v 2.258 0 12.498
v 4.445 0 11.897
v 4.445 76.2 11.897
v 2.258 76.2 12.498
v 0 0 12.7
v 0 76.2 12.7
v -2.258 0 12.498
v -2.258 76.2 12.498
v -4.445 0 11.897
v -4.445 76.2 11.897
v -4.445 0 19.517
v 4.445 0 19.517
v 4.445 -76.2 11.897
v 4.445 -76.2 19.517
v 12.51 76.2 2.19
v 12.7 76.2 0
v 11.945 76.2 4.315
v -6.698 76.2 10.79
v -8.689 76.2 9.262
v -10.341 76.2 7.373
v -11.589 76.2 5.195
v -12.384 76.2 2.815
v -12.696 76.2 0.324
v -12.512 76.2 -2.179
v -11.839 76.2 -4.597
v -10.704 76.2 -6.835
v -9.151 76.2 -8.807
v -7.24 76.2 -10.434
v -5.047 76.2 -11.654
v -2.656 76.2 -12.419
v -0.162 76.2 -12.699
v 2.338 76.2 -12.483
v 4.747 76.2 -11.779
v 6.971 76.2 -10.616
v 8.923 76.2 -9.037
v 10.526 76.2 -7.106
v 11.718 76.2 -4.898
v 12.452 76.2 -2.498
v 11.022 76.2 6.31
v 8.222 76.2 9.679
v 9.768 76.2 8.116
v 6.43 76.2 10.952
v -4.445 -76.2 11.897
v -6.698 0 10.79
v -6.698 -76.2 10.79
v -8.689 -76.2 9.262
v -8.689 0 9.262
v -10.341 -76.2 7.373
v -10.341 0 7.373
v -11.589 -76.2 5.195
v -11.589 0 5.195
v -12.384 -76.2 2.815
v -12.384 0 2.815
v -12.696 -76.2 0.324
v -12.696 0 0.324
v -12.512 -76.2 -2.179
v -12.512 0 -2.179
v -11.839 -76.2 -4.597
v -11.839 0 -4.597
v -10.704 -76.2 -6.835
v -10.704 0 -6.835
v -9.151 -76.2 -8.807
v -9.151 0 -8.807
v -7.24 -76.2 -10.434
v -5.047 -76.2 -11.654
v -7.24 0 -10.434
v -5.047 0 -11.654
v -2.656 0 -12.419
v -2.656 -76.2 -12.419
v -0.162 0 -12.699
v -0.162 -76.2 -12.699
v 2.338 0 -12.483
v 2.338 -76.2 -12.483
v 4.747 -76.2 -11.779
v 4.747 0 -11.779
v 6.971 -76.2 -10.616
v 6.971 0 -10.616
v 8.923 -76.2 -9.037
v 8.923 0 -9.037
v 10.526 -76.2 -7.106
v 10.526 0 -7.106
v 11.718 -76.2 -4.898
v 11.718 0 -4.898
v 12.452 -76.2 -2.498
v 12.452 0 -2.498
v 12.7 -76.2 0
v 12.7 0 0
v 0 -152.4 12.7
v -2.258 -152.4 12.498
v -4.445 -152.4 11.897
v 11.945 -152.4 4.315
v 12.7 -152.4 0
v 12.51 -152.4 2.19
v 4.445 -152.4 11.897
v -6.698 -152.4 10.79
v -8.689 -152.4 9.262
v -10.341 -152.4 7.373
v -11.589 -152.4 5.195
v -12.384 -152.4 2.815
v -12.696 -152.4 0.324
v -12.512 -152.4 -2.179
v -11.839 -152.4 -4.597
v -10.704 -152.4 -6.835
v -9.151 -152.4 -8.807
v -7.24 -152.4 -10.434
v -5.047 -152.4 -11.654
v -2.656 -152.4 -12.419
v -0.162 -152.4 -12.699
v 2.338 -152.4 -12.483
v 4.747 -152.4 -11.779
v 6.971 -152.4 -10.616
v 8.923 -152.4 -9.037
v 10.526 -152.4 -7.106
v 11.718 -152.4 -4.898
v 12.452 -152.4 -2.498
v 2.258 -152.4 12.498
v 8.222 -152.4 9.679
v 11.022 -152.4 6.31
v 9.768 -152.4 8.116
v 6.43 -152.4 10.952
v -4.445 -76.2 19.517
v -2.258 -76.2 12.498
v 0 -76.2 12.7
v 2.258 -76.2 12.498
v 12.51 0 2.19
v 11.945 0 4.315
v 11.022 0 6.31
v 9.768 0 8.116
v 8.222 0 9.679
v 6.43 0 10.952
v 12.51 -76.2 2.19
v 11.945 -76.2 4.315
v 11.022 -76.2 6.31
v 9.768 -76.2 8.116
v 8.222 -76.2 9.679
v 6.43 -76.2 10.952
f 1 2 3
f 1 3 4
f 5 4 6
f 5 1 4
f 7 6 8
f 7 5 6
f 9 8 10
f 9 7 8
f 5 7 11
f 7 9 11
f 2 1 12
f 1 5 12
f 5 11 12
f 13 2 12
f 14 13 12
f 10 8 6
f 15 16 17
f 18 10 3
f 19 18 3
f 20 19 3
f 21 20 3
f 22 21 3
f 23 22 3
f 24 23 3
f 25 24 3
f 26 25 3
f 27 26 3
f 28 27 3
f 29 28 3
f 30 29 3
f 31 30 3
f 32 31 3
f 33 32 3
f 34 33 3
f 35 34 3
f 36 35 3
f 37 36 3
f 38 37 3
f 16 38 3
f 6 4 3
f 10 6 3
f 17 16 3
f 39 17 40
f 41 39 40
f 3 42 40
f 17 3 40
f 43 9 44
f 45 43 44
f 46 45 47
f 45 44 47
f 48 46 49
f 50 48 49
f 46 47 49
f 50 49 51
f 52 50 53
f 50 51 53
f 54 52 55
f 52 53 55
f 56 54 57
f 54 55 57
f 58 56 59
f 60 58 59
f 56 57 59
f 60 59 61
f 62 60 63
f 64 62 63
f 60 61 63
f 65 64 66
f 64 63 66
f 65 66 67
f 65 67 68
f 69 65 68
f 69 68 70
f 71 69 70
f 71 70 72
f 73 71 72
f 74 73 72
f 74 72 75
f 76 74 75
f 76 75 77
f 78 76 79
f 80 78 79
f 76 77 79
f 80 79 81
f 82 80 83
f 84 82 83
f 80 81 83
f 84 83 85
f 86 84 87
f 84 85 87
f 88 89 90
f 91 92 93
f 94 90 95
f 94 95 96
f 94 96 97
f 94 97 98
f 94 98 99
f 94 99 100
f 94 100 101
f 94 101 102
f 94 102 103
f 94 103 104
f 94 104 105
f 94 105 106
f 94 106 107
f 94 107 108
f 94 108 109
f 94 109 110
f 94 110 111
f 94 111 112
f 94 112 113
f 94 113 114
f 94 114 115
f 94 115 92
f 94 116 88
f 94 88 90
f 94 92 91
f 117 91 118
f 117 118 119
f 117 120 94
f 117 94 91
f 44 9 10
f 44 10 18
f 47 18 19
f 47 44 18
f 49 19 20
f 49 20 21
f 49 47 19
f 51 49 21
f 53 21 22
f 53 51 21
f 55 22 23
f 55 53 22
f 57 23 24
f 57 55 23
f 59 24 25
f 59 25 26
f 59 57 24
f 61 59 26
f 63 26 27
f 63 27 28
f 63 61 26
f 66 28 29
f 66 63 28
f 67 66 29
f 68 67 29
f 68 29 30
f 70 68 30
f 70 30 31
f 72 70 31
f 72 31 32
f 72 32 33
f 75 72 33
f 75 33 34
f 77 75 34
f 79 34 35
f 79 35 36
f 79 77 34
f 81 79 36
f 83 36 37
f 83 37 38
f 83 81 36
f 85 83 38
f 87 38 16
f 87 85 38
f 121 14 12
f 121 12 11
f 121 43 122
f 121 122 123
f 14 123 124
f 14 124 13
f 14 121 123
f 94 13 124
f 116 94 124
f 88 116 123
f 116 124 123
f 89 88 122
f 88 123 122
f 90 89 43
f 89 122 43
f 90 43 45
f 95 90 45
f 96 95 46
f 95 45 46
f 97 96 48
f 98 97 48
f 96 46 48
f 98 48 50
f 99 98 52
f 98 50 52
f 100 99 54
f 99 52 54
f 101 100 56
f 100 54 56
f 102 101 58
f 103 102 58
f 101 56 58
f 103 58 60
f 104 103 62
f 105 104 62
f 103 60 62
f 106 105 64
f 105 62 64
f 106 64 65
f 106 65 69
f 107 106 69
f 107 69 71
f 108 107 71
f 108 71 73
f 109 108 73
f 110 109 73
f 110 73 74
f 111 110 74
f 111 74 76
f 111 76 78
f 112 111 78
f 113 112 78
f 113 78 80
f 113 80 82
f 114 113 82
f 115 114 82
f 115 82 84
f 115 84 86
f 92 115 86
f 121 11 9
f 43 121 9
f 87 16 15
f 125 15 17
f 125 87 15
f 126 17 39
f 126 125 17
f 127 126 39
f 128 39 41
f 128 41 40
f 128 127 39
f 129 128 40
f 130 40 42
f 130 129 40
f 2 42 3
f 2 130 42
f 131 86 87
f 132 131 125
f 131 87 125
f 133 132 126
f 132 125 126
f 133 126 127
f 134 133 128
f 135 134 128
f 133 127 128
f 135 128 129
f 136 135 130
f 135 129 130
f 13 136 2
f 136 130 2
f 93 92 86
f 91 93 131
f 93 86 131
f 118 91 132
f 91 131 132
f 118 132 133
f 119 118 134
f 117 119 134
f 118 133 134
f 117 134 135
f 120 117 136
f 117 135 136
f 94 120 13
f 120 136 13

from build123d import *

# Parameters (mm, degrees)
F1_DEPTH      = 76.2
F2_DEPTH      = 76.2
F2_DEPTH_BACK = 152.4


with BuildPart() as f1:
    # F0 (on Front) → F1 (new body)
    with BuildSketch(Plane.XZ):
        with BuildLine():
            ThreePointArc((-4.445, 11.8967211869), (-7.2401139494, -10.4341147205), (12.7, 0))
            ThreePointArc((12.7, 0), (10.4341147205, 7.2401139494), (4.445, 11.8967211869))
            ThreePointArc((4.445, 11.8967211869), (0, 12.7), (-4.445, 11.8967211869))
        make_face()
        with BuildLine():
            ThreePointArc((-4.445, 11.8967211869), (0, 12.7), (4.445, 11.8967211869))
            Line((4.445, 11.8967211869), (4.445, 19.5167211869))
            Line((4.445, 19.5167211869), (-4.445, 19.5167211869))
            Line((-4.445, 19.5167211869), (-4.445, 11.8967211869))
        make_face()
    extrude(amount=F1_DEPTH)

    # F0 (on Front) → F2 (join, two sides)
    with BuildSketch(Plane.XZ) as f2_sk:
        with BuildLine():
            ThreePointArc((-4.445, 11.8967211869), (-7.2401139494, -10.4341147205), (12.7, 0))
            ThreePointArc((12.7, 0), (10.4341147205, 7.2401139494), (4.445, 11.8967211869))
            ThreePointArc((4.445, 11.8967211869), (0, 12.7), (-4.445, 11.8967211869))
        make_face()
    extrude(amount=-F2_DEPTH)
    extrude(f2_sk.sketch, amount=F2_DEPTH_BACK)


solid = f1.part
